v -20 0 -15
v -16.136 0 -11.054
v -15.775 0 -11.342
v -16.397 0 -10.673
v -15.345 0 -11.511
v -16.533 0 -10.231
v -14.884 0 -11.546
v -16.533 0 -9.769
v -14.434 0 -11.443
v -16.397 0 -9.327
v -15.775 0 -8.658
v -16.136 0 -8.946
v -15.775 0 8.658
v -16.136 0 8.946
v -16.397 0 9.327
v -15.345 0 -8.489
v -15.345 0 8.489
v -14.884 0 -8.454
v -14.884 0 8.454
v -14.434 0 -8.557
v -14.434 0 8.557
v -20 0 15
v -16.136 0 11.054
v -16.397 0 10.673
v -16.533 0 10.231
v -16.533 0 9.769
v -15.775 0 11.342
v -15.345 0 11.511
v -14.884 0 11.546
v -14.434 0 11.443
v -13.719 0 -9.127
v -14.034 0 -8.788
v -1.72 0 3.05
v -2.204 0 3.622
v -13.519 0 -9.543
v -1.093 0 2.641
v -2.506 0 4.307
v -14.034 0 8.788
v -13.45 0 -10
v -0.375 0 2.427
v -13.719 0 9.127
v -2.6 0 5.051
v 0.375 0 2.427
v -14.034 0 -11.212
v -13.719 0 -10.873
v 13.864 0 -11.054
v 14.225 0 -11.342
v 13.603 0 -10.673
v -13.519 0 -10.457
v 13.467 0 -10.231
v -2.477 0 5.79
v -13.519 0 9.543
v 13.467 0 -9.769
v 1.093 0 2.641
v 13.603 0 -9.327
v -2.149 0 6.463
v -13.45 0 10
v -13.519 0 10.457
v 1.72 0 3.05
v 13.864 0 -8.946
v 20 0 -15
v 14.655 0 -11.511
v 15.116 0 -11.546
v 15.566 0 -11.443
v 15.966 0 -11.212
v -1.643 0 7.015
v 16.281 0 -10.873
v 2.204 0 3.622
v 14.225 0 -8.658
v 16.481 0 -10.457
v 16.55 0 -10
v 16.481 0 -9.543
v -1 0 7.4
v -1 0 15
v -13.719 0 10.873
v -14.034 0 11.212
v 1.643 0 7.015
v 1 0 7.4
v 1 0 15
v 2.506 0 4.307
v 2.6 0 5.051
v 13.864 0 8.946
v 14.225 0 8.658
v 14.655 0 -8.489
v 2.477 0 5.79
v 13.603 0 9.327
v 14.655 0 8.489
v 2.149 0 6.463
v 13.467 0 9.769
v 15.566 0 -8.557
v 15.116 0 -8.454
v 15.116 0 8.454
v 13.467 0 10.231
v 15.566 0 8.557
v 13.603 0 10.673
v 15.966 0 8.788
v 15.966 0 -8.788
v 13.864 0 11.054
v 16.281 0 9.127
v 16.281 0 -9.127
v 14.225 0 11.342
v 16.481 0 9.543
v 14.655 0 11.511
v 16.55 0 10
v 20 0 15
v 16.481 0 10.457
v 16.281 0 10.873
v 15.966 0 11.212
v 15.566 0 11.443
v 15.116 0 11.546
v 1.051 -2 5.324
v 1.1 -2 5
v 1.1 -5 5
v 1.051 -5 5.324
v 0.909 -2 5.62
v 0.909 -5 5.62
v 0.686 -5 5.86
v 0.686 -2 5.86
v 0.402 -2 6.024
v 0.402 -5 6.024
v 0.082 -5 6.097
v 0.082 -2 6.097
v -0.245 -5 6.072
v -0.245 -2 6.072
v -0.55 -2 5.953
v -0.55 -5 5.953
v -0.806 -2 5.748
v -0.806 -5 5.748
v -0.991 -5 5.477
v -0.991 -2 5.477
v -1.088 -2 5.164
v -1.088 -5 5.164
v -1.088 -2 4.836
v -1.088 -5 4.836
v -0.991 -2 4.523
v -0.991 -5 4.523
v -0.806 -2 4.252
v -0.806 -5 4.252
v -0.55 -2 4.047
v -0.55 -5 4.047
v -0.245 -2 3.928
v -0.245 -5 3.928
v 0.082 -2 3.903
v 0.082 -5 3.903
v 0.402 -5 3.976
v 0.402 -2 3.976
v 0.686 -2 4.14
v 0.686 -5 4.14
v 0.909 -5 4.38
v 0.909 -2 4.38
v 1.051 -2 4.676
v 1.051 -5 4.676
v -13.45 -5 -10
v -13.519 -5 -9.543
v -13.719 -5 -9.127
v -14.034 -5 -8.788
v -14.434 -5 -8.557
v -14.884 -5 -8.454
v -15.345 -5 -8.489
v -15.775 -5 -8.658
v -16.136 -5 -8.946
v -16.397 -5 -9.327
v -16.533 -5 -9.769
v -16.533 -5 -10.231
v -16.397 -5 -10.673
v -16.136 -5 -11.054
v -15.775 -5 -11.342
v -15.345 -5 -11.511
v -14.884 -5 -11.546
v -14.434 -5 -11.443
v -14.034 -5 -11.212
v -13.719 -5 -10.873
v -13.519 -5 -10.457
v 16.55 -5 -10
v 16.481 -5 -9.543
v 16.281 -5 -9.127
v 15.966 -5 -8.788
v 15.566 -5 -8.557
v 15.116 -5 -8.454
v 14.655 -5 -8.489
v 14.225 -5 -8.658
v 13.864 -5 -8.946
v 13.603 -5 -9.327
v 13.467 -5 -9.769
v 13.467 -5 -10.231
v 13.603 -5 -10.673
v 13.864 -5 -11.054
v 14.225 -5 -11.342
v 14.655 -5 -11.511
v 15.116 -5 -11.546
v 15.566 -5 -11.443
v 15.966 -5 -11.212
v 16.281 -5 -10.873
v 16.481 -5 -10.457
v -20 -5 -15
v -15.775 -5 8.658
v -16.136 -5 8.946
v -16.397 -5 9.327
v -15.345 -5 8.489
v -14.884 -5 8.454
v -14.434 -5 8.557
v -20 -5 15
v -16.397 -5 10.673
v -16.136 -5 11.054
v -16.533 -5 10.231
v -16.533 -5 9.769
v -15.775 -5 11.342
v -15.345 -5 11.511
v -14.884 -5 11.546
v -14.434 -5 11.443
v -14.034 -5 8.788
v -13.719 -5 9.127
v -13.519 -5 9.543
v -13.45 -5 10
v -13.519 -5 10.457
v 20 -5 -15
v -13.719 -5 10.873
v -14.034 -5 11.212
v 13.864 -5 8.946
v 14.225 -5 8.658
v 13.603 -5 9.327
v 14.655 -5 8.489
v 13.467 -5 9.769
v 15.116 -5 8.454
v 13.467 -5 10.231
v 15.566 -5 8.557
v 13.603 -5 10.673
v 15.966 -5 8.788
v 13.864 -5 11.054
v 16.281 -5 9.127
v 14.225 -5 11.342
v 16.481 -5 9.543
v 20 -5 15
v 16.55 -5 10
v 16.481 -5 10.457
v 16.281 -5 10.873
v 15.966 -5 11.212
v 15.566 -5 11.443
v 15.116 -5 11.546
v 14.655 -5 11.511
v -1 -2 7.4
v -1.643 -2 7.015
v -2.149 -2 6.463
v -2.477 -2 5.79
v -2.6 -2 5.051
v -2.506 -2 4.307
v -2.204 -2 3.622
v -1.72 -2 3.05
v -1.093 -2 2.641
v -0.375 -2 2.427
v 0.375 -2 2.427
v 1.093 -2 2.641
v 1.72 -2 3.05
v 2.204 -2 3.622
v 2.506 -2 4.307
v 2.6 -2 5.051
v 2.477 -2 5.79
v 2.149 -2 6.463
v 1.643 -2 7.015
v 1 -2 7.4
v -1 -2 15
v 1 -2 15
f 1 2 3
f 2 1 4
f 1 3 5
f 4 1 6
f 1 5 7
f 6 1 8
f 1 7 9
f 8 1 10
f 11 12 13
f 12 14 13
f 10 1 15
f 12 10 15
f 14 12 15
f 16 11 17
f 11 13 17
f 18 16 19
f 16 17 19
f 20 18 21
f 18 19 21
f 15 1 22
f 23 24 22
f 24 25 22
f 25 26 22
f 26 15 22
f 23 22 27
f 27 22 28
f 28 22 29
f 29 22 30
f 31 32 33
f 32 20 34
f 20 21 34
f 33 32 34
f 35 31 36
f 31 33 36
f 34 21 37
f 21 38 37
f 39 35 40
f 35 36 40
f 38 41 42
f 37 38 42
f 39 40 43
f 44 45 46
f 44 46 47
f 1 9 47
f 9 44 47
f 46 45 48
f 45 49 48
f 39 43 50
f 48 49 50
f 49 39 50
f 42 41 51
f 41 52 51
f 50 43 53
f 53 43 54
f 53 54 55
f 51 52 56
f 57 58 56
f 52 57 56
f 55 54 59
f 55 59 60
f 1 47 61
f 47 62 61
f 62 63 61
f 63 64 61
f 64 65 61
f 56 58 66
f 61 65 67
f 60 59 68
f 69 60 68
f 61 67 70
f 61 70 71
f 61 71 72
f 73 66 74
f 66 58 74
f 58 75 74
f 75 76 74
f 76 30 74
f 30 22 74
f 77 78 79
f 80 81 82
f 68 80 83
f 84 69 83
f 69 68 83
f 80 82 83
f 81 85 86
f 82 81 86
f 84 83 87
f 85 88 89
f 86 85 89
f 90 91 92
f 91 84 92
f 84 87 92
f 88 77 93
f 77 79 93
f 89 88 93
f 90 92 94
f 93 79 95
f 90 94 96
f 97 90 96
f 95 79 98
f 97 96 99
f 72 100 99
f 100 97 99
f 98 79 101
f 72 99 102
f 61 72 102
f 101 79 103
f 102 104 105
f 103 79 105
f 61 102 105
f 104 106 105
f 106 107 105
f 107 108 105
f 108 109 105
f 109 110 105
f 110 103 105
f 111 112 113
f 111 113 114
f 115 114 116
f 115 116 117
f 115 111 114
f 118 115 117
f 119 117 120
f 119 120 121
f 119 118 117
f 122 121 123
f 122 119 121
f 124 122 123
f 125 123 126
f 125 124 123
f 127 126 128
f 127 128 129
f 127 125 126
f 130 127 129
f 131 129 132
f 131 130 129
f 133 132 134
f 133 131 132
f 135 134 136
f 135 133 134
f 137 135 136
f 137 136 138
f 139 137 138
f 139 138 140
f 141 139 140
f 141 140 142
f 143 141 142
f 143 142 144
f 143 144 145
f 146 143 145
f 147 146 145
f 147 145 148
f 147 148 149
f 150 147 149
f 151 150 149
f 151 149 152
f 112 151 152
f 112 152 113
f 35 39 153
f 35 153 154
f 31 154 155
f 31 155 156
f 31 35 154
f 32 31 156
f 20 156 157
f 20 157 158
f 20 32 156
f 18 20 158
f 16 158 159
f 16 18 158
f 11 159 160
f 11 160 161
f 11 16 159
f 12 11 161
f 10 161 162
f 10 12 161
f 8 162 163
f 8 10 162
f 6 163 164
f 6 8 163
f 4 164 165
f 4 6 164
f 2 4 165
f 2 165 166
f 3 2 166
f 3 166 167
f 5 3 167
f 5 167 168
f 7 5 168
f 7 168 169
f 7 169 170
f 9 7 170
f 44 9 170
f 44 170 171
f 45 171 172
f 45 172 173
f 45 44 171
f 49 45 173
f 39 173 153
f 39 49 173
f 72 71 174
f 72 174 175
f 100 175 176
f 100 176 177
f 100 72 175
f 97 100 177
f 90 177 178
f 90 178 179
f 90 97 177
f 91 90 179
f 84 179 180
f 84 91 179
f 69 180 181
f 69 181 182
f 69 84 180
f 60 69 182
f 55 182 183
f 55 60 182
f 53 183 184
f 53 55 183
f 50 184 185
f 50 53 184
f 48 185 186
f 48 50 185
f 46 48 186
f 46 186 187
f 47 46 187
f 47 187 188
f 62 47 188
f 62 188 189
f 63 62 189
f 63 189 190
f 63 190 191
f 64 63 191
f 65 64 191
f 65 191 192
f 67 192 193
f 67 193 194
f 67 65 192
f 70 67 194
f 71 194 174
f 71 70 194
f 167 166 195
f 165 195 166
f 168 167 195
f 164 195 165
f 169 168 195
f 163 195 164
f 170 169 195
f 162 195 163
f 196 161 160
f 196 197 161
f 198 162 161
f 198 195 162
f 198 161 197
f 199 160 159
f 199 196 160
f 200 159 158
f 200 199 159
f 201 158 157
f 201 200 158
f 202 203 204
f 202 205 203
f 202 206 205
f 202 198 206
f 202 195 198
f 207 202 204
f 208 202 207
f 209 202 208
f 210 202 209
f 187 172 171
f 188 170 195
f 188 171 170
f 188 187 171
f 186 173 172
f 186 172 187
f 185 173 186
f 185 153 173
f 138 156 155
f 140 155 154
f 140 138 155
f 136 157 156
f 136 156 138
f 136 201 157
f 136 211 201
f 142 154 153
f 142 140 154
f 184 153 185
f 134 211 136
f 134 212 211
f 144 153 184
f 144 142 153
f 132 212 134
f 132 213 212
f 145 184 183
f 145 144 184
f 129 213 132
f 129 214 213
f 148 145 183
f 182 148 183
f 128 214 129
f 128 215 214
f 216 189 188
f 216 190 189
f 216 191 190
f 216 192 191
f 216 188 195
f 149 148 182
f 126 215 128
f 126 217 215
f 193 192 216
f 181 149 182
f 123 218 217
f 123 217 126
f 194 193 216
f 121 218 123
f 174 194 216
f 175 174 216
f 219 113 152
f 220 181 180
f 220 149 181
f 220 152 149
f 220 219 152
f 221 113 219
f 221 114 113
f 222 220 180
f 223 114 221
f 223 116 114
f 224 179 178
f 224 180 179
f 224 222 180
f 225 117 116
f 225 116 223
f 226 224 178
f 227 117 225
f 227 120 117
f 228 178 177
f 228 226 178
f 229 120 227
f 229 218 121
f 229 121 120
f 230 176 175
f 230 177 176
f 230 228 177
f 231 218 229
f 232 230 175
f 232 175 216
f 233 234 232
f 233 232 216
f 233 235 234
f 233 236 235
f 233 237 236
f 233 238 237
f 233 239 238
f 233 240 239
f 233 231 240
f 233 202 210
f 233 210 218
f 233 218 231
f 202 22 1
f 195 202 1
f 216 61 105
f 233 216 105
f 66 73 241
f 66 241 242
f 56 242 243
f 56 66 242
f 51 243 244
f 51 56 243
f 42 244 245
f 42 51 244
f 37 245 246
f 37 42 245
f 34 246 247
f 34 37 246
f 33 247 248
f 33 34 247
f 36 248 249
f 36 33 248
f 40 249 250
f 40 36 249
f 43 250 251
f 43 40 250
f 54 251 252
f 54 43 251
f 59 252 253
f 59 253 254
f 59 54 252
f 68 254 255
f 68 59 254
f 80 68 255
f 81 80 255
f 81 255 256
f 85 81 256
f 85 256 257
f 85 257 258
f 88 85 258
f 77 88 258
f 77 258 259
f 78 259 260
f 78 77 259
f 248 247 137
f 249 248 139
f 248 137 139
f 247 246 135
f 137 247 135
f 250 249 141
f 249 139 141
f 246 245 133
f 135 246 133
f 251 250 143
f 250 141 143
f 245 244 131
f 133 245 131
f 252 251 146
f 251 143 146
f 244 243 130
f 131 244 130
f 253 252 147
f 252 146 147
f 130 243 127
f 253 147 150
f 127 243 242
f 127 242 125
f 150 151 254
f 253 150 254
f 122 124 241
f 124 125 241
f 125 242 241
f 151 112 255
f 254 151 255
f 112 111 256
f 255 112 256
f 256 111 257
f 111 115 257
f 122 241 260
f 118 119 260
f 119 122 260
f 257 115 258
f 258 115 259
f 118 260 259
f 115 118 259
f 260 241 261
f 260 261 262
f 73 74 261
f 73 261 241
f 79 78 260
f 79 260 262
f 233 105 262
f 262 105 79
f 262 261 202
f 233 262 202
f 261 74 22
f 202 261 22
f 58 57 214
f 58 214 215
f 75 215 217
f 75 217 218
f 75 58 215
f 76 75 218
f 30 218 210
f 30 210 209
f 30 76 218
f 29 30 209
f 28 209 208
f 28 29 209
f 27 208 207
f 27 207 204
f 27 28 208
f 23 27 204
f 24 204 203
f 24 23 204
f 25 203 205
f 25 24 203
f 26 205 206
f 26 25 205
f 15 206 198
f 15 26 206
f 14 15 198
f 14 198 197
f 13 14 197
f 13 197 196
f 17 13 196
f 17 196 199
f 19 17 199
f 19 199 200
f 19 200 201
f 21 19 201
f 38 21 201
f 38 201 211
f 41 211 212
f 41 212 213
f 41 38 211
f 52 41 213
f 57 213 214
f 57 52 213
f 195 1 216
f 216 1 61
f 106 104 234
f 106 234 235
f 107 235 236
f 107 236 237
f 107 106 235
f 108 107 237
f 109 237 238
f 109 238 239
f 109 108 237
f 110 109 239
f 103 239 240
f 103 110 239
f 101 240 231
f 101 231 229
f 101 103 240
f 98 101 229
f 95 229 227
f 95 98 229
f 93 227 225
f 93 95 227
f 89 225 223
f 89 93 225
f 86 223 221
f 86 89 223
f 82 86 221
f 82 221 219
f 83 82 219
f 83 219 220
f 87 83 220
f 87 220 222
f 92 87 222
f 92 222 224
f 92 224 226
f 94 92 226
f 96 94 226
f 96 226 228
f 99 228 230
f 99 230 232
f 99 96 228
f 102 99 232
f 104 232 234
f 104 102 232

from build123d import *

# Parameters (mm, degrees)
F0_R     = 1.55
F0_R_2   = 1.1
F1_DEPTH = 5
F2_DEPTH = 2


with BuildPart() as f1:
    # F0 (on Front) → F1 (new body)
    with BuildSketch(Plane.XZ):
        with BuildLine():
            Line((-20, -15), (20, -15))
            Line((20, -15), (20, 15))
            Line((20, 15), (1, 15))
            Line((1, 15), (1, 7.4))
            ThreePointArc((1, 7.4), (0, 2.4), (-1, 7.4))
            Line((-1, 7.4), (-1, 15))
            Line((-1, 15), (-20, 15))
            Line((-20, 15), (-20, -15))
        make_face()
        with Locations((-15, -10)):
            Circle(F0_R, mode=Mode.SUBTRACT)
        with Locations((15, -10)):
            Circle(F0_R, mode=Mode.SUBTRACT)
        with Locations((-15, 10)):
            Circle(F0_R, mode=Mode.SUBTRACT)
        with Locations((15, 10)):
            Circle(F0_R, mode=Mode.SUBTRACT)
        with BuildLine():
            Line((1, 7.4), (1, 15))
            Line((1, 15), (-1, 15))
            Line((-1, 15), (-1, 7.4))
            ThreePointArc((-1, 7.4), (0, 2.4), (1, 7.4))
        make_face()
        with Locations((0, 5)):
            Circle(F0_R_2, mode=Mode.SUBTRACT)
    extrude(amount=F1_DEPTH)

    # F0 (on Front) → F2 (cut)
    with BuildSketch(Plane.XZ):
        with BuildLine():
            Line((1, 7.4), (1, 15))
            Line((1, 15), (-1, 15))
            Line((-1, 15), (-1, 7.4))
            ThreePointArc((-1, 7.4), (0, 2.4), (1, 7.4))
        make_face()
        with Locations((0, 5)):
            Circle(F0_R_2, mode=Mode.SUBTRACT)
    extrude(amount=F2_DEPTH, mode=Mode.SUBTRACT)


solid = f1.part
